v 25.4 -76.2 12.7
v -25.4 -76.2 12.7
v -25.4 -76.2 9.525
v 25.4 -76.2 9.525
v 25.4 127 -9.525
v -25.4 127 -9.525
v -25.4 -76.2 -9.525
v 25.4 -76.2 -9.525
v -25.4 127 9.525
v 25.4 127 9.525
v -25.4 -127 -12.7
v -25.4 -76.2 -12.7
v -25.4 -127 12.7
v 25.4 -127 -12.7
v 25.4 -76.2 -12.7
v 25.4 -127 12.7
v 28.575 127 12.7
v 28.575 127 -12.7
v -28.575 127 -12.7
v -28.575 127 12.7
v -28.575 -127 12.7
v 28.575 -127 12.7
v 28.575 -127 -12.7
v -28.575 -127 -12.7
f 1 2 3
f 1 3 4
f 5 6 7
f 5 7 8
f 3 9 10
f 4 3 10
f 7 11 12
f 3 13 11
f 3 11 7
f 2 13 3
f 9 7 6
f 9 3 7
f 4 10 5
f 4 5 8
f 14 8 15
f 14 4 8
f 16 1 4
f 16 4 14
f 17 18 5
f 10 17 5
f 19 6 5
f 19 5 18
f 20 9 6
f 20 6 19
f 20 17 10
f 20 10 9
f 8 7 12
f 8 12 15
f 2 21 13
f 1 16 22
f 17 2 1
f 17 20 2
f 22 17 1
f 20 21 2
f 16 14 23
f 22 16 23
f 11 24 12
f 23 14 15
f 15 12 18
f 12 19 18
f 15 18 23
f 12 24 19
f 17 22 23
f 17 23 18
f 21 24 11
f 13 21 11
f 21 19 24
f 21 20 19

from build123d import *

# Parameters (mm, degrees)
BOSS_EXTRUDE2_DEPTH = 12.7
SKETCH2_W           = 50.8
SKETCH2_H           = 19.05
CUT_EXTRUDE1_DEPTH  = 256.917605149


with BuildPart() as part:
    # Sketch1 → Boss-Extrude2 (new, symmetric)
    with BuildSketch(Plane.XY):
        Polygon((-25.4, -127), (-25.4, -76.2), (25.4, -76.2), (25.4, -127), (28.575, -127), (28.575, 127), (-28.575, 127), (-28.575, -127), align=None)
    extrude(amount=BOSS_EXTRUDE2_DEPTH, both=True)

    # Sketch2 → Cut-Extrude1 (cut, through all)
    with BuildSketch(Plane(origin=(0, 127, 0), x_dir=(1, 0, 0), z_dir=(0, 1, 0))):
        Rectangle(SKETCH2_W, SKETCH2_H)
    extrude(amount=-CUT_EXTRUDE1_DEPTH, mode=Mode.SUBTRACT)


solid = part.part
